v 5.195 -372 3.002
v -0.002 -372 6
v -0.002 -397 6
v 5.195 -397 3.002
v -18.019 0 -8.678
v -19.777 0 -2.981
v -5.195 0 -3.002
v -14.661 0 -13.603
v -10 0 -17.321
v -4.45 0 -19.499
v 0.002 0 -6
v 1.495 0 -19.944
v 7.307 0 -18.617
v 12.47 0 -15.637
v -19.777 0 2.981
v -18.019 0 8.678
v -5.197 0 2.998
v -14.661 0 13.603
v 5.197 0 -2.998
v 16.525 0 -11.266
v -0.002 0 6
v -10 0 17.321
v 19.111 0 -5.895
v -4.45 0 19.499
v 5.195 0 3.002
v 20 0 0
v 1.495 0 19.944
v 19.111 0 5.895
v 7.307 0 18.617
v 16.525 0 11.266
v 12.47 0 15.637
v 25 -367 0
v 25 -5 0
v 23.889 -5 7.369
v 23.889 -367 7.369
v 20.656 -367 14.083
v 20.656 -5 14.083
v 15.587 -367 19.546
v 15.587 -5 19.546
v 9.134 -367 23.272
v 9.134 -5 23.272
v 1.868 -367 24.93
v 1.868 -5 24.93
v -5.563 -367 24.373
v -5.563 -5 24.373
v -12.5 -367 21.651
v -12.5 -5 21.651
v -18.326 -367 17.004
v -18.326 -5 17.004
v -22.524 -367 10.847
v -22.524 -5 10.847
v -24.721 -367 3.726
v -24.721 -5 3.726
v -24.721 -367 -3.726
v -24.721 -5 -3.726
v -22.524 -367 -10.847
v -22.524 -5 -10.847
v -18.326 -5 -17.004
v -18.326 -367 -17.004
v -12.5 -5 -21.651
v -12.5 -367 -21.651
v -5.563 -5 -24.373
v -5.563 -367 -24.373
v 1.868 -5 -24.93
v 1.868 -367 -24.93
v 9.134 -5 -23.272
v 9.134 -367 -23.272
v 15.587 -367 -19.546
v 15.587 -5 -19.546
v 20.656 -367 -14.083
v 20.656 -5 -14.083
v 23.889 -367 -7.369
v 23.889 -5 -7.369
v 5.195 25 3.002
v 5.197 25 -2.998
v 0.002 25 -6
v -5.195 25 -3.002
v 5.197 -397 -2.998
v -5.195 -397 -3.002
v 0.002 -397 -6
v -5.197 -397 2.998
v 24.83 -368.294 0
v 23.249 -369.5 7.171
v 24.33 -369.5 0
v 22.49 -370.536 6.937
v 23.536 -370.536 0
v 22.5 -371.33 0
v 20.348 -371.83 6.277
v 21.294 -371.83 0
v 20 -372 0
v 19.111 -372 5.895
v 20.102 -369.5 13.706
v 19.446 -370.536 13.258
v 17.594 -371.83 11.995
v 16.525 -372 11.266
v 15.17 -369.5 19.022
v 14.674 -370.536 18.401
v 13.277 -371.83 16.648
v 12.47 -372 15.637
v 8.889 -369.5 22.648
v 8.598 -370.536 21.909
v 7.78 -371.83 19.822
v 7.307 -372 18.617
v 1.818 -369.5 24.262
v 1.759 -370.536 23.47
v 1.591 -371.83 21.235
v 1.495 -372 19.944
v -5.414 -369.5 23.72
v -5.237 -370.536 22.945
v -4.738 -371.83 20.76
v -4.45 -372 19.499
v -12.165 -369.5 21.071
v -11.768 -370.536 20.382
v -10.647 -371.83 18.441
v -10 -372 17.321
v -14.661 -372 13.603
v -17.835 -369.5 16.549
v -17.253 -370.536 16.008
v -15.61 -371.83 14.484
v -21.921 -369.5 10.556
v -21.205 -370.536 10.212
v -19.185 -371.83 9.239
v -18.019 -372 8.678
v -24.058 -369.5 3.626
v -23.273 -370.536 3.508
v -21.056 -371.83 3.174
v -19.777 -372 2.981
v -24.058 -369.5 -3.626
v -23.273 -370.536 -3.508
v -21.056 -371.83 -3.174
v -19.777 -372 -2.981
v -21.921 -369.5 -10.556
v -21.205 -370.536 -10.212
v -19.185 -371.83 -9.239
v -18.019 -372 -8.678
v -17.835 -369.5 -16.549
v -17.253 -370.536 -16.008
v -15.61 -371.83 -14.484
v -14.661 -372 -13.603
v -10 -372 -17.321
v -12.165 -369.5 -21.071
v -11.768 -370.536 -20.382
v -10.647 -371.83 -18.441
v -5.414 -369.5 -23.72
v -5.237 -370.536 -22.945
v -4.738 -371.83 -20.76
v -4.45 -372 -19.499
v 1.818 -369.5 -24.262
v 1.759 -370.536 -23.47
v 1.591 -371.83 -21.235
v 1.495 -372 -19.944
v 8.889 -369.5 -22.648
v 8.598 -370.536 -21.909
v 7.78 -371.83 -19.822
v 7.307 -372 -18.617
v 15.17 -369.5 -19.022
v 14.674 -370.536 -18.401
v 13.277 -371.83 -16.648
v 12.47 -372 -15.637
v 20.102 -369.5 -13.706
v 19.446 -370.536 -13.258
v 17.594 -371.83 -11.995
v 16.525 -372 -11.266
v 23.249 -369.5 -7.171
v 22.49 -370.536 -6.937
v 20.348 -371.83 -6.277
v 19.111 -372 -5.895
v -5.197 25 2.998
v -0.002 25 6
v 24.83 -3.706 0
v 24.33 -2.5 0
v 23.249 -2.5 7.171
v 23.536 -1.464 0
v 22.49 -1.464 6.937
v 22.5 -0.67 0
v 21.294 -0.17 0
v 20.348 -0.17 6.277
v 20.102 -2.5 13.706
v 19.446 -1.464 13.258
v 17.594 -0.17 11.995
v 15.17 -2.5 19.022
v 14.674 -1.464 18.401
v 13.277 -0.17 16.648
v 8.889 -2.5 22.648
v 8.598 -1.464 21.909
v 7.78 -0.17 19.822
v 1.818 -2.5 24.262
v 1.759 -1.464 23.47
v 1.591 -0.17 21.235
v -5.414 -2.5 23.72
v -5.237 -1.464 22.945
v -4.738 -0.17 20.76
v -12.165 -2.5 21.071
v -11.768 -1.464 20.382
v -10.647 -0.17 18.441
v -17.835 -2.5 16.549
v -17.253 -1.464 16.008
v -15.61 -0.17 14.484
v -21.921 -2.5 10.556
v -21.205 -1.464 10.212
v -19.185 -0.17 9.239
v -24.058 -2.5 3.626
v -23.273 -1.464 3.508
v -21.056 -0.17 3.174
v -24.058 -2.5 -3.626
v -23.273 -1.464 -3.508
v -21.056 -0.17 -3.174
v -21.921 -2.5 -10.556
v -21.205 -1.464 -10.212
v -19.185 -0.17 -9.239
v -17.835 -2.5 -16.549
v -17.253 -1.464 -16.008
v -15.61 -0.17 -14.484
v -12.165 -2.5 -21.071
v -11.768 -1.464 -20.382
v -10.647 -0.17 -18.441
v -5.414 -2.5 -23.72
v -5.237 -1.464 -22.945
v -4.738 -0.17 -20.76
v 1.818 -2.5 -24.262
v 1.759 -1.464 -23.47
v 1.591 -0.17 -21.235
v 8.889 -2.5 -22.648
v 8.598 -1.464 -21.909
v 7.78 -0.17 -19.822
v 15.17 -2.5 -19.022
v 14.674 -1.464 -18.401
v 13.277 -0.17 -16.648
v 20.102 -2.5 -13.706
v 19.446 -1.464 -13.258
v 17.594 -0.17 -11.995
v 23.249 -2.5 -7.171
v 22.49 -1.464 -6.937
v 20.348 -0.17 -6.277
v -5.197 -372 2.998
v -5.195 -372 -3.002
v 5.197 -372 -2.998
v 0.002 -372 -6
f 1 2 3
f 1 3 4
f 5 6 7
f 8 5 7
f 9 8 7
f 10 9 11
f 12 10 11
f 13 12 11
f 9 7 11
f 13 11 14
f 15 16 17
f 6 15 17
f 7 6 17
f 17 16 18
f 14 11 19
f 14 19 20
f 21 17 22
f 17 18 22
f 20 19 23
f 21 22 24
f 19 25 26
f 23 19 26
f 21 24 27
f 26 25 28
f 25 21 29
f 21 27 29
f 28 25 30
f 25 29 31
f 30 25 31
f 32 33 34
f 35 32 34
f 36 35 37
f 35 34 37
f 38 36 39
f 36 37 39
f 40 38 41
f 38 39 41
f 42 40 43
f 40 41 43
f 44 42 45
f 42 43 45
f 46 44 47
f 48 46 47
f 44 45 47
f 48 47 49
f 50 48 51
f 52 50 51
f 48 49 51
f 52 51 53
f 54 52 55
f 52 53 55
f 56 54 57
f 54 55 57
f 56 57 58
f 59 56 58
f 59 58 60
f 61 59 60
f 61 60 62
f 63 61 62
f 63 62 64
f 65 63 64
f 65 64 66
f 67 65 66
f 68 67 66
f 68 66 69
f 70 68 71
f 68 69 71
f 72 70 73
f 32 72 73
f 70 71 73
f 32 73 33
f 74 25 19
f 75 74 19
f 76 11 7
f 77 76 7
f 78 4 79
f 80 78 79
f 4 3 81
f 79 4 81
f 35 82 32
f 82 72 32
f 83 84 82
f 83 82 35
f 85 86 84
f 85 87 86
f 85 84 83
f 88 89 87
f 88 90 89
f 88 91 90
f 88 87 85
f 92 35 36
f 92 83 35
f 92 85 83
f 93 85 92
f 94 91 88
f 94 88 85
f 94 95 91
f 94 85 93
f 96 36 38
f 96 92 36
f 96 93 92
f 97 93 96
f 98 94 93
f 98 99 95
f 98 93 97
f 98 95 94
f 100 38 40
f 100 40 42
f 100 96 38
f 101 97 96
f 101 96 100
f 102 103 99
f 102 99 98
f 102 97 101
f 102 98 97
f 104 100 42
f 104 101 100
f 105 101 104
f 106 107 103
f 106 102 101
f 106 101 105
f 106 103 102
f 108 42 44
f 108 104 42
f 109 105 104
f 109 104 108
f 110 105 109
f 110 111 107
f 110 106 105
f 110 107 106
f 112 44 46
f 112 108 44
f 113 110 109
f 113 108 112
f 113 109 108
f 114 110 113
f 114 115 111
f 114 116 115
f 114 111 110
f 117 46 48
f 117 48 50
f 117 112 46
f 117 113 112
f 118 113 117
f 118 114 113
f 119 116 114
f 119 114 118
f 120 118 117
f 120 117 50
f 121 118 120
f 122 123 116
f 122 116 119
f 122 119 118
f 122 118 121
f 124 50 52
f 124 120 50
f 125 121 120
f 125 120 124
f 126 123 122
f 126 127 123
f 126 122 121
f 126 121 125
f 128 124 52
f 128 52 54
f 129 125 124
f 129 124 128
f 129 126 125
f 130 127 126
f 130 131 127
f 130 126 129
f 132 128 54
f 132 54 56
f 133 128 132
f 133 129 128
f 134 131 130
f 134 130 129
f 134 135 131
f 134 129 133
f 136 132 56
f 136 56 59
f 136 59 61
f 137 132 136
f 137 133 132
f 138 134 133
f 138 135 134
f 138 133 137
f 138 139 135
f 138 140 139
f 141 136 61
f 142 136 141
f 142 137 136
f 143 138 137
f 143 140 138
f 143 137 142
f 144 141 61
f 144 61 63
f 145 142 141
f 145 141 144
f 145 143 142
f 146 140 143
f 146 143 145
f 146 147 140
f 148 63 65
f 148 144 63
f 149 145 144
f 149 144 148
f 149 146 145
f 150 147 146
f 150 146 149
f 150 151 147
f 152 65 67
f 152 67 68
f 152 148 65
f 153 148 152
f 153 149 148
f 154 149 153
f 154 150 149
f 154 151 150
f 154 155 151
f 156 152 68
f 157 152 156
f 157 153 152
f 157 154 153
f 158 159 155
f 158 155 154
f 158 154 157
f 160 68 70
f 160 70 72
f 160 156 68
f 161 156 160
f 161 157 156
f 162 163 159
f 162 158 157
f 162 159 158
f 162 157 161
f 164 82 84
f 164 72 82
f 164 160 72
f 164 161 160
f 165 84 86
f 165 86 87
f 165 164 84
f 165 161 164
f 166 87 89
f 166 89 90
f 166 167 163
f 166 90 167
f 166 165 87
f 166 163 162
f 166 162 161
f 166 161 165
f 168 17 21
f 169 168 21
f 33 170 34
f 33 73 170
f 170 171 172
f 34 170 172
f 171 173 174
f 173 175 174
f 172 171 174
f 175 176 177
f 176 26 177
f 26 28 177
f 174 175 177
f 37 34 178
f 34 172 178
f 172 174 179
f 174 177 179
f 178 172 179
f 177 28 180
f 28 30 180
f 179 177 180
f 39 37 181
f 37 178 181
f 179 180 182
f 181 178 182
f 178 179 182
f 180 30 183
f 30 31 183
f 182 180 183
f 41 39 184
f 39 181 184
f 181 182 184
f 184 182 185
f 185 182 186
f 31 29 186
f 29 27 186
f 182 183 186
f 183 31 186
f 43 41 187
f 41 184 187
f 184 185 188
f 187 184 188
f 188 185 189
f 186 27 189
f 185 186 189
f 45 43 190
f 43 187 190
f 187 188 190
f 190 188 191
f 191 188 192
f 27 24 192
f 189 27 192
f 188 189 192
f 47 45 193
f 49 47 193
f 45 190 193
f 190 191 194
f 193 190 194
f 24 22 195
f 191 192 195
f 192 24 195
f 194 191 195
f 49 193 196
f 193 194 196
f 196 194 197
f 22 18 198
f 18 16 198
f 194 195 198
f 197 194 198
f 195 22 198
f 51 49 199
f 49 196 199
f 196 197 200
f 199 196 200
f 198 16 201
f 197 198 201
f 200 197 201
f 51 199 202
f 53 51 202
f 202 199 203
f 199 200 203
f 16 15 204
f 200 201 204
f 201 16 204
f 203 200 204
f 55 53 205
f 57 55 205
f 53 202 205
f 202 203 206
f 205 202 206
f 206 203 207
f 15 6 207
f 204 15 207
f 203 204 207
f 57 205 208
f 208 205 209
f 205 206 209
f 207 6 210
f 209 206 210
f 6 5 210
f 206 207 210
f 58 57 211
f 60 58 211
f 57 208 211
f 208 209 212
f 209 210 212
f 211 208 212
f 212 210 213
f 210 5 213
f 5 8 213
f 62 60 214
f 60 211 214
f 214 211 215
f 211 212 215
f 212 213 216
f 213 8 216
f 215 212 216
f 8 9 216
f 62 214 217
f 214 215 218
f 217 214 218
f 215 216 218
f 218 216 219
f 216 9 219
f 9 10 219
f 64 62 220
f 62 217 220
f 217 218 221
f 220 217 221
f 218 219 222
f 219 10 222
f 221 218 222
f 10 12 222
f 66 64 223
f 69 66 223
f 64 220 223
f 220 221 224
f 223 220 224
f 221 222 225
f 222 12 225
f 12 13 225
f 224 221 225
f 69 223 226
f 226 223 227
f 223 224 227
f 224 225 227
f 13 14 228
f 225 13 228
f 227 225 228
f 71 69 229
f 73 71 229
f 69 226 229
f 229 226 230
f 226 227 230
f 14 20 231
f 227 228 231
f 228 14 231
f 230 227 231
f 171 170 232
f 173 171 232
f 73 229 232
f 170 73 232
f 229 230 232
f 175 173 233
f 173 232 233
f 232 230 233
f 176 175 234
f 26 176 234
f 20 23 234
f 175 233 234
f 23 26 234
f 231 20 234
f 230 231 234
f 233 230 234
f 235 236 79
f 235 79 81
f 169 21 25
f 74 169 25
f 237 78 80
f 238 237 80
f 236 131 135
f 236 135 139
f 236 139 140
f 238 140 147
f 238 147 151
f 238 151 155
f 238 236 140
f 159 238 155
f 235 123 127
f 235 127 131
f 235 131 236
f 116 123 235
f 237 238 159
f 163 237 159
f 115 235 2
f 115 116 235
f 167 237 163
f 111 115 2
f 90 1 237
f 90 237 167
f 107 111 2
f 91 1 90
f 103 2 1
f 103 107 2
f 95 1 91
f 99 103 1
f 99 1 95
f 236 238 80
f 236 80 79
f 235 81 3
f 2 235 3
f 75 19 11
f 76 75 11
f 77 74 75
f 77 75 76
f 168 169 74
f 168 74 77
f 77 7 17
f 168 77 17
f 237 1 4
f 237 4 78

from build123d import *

# Parameters (mm, degrees)
F0_R          = 25
F1_DEPTH      = 372
F2_R          = 5
F4_DEPTH      = 25
F4_DEPTH_BACK = 397


with BuildPart() as f1:
    # F0 (on Front) → F1 (new body)
    with BuildSketch(Plane.XZ):
        Circle(F0_R)
    extrude(amount=F1_DEPTH)

    # F2
    f2_edges = [f1.edges().sort_by_distance(p)[0] for p in [
        (-25, -372, 0),
        (-25, 0, 0),
    ]]
    fillet(f2_edges, radius=F2_R)

    # F3 (on face) → F4 (join, two sides)
    with BuildSketch(Plane(origin=(0, 0, 0), x_dir=(-1, 0, 0), z_dir=(0, 1, 0))) as f4_sk:
        Polygon((-0.001922, -6), (5.195191, -3.001664), (5.197113, 2.998336), (0.001922, 6), (-5.195191, 3.001664), (-5.197113, -2.998336), align=None)
    extrude(amount=F4_DEPTH)
    extrude(f4_sk.sketch, amount=-F4_DEPTH_BACK)


solid = f1.part
